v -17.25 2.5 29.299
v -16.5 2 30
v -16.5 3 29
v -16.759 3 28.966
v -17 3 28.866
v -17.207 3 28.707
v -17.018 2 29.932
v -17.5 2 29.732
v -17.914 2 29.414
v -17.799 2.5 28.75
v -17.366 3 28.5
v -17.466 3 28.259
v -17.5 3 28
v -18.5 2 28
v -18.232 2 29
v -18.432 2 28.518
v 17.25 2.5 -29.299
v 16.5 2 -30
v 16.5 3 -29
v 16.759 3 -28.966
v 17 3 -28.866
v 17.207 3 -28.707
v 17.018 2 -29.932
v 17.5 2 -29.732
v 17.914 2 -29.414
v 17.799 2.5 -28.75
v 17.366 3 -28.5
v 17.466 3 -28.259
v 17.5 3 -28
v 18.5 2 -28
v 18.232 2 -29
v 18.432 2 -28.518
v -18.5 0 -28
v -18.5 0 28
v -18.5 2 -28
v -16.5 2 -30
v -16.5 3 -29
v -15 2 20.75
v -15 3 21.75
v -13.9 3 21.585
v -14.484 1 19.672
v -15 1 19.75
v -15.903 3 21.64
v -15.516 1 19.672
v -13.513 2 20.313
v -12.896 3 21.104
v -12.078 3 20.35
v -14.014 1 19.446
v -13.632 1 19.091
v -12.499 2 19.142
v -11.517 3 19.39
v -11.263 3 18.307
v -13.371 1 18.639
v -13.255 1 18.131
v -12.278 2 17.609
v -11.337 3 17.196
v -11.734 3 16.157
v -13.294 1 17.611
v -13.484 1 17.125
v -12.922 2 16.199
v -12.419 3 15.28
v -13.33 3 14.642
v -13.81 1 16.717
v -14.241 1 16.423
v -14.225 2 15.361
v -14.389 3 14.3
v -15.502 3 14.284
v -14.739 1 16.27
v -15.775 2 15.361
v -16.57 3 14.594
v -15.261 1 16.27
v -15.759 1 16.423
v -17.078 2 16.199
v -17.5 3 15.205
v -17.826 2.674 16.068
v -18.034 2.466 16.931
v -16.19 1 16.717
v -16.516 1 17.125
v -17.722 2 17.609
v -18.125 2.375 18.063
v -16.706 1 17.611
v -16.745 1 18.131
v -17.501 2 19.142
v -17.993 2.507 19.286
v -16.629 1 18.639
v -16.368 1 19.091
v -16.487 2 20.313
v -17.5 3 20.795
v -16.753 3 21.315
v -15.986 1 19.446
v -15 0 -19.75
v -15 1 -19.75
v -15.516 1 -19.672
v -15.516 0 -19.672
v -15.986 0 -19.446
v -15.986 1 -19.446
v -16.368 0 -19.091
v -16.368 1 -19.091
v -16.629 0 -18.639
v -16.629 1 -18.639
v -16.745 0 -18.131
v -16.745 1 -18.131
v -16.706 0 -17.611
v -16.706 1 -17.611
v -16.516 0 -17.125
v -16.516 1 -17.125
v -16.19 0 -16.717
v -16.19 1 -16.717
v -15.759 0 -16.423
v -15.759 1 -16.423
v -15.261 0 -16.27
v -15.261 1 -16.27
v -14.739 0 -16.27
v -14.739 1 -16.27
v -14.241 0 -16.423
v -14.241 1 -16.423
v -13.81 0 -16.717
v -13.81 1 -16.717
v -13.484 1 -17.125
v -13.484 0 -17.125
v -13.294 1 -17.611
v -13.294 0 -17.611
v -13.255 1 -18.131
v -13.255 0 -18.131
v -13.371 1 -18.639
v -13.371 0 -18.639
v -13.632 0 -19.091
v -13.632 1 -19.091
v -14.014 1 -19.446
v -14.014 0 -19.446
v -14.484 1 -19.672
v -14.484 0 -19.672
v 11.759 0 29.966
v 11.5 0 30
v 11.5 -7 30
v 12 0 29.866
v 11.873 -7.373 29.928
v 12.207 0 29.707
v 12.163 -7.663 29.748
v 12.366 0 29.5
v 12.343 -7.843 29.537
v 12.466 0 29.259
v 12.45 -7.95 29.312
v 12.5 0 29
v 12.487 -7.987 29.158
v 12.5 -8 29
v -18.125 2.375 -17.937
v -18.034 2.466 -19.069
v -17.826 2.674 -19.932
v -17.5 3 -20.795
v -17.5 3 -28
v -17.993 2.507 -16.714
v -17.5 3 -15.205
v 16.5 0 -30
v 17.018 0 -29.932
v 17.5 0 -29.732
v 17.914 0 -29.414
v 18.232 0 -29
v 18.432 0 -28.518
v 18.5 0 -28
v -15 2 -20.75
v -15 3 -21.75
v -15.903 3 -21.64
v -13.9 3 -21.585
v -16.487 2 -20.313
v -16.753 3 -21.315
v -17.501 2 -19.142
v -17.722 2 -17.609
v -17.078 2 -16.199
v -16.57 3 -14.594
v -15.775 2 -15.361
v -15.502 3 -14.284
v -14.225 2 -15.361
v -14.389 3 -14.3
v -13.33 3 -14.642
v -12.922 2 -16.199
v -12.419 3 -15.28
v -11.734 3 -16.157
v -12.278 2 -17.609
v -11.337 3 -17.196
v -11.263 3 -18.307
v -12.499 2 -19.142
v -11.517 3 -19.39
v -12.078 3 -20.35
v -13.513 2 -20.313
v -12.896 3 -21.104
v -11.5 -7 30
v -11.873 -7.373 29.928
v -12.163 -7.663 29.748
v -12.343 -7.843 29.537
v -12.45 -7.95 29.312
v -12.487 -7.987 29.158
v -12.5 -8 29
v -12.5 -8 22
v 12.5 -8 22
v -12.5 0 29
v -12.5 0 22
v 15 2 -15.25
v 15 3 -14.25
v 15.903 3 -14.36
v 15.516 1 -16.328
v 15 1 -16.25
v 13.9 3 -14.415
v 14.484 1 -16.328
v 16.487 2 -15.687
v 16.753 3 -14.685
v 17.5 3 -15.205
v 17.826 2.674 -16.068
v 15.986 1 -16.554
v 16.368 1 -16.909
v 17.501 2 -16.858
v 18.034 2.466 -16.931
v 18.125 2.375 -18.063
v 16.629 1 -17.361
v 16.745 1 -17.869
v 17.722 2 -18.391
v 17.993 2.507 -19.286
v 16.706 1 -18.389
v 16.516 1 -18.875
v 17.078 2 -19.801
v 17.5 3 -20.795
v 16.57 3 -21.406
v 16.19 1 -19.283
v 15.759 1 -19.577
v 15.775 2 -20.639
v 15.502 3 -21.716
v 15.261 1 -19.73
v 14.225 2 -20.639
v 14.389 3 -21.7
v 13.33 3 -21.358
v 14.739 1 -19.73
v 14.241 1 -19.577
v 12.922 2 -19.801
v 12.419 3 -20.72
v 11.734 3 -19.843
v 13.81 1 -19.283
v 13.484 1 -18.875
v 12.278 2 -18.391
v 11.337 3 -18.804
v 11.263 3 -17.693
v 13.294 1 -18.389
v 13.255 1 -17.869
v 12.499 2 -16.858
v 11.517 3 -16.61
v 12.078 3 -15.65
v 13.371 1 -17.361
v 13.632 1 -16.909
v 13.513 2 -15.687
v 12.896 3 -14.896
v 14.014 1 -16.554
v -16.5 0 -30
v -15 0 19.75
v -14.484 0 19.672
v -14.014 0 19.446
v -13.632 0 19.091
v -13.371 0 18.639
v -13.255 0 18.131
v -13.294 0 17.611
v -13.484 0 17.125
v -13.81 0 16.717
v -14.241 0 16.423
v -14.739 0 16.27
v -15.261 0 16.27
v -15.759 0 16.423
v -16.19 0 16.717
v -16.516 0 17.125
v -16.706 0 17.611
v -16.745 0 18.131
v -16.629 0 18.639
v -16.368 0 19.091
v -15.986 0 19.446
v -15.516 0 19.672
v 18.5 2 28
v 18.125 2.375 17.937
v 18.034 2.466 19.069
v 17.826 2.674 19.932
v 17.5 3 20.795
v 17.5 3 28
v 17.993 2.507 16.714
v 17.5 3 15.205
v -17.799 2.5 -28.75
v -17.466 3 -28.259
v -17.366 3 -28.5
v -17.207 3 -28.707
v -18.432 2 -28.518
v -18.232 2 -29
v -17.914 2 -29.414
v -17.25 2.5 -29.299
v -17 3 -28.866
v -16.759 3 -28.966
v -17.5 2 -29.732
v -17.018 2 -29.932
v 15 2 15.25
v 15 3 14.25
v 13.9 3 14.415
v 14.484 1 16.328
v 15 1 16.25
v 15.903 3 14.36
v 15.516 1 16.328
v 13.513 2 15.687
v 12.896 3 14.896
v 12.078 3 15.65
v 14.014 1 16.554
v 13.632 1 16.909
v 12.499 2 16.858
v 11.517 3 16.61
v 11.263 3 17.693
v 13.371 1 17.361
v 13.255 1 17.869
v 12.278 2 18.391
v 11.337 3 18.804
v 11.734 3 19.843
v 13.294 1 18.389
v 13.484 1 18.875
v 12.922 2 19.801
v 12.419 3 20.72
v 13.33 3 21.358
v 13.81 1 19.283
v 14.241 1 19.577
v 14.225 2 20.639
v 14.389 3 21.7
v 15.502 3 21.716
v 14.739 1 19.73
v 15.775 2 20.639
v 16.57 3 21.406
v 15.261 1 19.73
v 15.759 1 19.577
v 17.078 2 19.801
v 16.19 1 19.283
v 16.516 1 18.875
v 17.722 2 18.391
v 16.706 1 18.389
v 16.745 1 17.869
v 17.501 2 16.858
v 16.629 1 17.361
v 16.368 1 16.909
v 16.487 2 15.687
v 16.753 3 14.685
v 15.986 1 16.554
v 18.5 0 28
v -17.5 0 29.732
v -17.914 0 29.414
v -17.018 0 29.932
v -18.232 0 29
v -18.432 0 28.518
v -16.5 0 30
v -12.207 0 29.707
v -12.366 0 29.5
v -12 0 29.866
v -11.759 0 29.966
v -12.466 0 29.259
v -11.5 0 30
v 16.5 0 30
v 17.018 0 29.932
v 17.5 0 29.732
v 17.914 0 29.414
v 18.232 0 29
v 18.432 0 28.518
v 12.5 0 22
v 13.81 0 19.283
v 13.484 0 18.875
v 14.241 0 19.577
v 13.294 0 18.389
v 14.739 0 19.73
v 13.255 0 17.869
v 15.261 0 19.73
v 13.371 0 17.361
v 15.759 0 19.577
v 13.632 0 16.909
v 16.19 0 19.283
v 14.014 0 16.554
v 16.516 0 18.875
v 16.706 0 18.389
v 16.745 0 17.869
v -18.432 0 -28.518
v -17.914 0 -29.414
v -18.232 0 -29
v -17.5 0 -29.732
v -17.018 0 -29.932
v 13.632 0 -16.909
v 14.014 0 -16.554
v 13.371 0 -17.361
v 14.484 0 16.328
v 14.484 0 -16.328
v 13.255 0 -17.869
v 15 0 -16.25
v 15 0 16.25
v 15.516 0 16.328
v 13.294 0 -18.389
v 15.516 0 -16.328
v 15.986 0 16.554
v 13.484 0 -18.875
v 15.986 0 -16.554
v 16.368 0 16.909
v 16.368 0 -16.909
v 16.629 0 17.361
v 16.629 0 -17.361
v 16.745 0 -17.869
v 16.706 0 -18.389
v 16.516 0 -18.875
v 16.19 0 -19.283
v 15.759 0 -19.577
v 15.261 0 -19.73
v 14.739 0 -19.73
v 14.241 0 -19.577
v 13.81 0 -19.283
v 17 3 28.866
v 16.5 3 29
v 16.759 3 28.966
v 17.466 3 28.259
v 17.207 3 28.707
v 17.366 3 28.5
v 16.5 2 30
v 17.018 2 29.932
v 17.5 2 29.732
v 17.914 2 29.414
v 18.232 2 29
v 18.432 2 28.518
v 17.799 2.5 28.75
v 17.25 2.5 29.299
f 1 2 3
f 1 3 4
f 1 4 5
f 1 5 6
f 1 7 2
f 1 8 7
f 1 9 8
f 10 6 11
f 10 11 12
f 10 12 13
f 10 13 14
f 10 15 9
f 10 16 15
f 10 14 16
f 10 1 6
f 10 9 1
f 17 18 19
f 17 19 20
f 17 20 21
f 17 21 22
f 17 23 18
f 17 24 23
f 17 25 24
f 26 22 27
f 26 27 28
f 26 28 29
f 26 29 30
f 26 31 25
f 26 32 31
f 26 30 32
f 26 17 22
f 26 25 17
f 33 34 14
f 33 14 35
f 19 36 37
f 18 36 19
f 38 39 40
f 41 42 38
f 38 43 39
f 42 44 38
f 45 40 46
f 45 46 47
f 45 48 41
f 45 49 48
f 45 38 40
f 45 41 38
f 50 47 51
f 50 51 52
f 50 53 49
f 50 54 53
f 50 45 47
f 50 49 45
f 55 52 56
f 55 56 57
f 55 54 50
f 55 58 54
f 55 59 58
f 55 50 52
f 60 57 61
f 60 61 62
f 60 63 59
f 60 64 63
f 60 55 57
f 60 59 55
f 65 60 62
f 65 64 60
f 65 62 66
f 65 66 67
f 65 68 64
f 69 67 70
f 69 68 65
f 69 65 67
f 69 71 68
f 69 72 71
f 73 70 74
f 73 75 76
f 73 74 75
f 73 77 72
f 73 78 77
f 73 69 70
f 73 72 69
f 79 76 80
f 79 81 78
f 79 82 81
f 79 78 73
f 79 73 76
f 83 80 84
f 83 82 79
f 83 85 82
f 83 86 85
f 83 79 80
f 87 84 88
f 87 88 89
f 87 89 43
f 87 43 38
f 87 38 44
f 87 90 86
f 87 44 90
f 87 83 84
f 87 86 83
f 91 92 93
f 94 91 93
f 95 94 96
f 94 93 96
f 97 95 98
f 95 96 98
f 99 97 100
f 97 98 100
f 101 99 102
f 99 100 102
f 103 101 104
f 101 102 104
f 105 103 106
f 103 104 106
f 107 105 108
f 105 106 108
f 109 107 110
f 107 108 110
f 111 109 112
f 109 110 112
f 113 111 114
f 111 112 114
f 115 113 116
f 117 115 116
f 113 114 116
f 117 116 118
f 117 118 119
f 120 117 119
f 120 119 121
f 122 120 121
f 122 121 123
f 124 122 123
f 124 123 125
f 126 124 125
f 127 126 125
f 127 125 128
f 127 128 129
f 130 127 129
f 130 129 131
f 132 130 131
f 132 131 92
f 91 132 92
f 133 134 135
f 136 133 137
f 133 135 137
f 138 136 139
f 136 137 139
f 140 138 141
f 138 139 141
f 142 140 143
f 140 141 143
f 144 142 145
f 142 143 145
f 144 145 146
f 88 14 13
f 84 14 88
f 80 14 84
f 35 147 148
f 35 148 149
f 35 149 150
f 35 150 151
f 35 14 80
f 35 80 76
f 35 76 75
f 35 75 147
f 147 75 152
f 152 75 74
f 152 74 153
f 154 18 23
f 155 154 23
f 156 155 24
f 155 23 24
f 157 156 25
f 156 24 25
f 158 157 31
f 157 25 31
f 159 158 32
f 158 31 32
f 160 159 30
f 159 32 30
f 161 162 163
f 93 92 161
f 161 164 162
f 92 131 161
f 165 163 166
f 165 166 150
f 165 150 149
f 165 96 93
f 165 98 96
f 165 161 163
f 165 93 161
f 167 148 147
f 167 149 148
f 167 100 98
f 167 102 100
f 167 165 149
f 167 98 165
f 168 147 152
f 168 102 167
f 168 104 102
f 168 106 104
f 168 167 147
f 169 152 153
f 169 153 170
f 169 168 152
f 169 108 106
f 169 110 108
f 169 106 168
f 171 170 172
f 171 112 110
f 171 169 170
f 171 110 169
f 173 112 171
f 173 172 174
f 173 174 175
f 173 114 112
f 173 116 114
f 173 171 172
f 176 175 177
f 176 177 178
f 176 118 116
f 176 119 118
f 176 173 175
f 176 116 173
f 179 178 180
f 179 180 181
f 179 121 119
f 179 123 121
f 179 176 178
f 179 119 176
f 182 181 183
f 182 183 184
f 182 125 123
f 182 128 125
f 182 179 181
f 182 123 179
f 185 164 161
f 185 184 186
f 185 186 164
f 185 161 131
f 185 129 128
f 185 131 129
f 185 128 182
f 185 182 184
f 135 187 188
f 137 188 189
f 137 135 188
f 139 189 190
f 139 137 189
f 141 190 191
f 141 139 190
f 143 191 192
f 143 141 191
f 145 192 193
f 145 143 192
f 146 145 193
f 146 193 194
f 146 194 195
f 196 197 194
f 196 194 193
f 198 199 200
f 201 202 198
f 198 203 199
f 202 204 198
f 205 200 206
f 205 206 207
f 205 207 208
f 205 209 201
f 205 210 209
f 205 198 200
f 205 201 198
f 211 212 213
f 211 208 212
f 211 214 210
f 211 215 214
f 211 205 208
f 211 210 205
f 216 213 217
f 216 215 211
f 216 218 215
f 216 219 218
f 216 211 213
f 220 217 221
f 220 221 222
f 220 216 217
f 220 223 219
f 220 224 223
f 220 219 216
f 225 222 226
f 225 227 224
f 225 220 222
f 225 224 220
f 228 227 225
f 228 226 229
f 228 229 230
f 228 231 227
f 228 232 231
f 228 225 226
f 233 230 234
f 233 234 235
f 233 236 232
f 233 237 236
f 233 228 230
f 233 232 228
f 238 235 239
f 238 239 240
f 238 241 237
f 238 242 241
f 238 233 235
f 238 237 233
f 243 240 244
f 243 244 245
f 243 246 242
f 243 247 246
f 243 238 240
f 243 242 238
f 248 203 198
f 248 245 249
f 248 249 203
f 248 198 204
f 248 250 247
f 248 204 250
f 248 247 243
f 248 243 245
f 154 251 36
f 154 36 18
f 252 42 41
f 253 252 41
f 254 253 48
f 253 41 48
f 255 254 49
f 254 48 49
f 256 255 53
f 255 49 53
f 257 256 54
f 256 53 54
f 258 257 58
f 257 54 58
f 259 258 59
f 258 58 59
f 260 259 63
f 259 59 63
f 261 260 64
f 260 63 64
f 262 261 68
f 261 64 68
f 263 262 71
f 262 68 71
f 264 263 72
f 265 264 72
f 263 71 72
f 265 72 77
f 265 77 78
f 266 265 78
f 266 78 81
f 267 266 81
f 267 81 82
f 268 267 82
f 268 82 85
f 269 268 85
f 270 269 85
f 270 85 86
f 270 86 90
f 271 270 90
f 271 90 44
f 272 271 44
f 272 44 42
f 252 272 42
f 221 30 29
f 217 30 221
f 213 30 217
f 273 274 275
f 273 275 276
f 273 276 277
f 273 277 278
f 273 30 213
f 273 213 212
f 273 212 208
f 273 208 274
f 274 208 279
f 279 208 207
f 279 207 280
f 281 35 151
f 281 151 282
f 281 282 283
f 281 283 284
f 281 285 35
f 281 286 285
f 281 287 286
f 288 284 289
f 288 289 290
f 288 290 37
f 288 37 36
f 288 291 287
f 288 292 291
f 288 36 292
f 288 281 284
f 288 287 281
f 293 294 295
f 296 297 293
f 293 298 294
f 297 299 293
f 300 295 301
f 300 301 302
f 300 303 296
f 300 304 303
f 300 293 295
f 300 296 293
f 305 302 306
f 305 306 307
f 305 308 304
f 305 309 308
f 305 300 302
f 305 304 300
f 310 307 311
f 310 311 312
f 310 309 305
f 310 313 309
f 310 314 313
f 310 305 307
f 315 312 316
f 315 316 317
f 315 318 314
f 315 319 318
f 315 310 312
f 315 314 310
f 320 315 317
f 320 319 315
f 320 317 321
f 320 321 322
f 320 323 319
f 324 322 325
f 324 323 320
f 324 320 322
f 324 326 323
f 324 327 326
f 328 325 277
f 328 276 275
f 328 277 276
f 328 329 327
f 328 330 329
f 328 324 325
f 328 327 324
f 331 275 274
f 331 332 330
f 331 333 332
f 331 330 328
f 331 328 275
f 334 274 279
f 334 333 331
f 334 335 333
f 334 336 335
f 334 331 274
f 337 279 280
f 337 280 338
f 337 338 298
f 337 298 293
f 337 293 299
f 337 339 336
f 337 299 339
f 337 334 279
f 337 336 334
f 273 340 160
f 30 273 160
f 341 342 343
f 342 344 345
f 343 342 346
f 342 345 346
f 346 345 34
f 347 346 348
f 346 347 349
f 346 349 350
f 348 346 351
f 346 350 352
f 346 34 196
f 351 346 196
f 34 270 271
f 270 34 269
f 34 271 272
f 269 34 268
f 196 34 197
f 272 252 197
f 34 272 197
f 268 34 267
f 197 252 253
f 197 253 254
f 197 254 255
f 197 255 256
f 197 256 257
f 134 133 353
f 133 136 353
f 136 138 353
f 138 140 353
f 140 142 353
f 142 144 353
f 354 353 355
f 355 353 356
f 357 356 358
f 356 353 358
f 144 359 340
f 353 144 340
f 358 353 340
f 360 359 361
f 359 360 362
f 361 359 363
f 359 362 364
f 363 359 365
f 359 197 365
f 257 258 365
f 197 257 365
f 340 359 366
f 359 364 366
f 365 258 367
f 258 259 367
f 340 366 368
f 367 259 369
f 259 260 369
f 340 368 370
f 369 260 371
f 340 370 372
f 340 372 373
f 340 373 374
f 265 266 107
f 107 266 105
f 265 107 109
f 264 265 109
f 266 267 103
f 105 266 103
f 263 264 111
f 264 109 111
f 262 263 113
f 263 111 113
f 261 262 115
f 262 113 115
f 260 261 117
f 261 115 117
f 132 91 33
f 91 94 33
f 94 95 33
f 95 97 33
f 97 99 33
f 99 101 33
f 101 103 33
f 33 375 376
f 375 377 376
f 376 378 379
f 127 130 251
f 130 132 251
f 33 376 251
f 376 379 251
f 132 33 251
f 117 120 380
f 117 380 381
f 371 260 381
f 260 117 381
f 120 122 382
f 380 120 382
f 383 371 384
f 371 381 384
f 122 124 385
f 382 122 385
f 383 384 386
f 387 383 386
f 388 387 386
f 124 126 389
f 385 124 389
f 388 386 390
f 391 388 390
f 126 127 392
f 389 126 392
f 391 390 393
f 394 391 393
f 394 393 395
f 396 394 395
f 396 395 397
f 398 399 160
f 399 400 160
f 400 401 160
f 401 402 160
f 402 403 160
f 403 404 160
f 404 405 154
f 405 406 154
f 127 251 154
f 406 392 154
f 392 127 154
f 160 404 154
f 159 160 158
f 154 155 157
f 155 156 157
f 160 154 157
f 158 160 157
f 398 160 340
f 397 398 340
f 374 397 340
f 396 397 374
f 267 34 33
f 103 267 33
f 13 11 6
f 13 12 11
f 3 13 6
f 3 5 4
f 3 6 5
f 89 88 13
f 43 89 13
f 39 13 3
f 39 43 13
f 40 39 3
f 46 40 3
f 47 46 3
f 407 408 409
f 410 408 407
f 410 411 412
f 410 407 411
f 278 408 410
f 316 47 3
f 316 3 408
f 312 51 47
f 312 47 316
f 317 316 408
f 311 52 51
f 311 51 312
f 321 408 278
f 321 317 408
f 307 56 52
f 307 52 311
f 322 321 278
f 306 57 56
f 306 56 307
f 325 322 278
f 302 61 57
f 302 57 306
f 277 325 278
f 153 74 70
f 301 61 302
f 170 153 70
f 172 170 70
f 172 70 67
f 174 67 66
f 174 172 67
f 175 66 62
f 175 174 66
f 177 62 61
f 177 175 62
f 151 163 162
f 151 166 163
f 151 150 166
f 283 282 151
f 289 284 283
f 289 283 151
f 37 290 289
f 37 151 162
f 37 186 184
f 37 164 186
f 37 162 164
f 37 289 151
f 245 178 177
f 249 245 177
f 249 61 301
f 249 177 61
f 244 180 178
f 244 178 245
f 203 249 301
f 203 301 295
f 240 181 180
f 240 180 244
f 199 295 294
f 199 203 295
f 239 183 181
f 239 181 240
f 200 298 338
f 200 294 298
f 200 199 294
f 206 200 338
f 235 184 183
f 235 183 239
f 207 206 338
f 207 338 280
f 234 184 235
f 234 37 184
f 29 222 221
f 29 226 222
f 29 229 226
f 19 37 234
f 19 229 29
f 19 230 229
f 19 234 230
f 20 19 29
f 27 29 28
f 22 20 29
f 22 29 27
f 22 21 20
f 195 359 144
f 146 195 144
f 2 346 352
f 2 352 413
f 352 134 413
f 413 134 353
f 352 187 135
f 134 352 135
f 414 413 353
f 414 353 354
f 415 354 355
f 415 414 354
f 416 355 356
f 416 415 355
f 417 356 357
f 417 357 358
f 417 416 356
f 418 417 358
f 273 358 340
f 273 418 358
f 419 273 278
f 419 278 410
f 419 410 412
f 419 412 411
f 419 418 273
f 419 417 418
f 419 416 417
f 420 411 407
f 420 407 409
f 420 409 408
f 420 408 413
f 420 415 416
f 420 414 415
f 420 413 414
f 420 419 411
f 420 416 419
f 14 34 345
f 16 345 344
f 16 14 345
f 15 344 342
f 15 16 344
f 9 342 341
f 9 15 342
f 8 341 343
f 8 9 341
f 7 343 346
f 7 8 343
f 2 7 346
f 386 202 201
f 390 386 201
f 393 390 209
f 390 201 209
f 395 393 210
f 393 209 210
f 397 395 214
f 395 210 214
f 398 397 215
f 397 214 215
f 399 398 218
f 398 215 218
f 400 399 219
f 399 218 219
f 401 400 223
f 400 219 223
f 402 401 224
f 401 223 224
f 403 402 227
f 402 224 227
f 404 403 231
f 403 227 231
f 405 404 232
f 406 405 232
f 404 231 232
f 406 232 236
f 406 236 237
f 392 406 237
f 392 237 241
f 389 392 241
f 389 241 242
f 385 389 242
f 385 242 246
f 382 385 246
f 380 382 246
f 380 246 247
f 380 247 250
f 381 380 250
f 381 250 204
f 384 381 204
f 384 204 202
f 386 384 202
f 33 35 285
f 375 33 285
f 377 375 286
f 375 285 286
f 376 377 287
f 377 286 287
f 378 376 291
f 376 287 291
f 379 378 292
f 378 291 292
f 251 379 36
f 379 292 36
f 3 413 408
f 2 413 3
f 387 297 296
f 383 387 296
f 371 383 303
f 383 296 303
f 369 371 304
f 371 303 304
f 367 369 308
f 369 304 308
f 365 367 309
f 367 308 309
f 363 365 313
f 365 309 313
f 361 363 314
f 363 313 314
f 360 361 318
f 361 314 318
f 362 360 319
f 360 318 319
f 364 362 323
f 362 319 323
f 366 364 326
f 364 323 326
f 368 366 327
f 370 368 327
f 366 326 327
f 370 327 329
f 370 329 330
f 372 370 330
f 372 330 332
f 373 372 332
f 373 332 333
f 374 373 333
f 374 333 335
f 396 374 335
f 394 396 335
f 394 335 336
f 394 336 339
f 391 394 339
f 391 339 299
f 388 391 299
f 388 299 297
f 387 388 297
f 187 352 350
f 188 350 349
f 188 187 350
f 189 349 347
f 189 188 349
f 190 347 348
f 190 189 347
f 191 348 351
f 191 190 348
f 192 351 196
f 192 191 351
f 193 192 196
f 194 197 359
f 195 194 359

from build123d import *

# Parameters (mm, degrees)
SKETCH_1_W          = 37
SKETCH_1_H          = 60
EXTRUDE_1_DEPTH     = 3
SKETCH_2_R          = 1.75
CUT_EXTRUDE_1_DEPTH = 3
FILLET_1_R          = 2
SKETCH_3_W          = 25
SKETCH_3_H          = 8
EXTRUDE_2_DEPTH     = 8
FILLET_2_R          = 1
CHAMFER_2_SIZE      = 1
CHAMFER_1_SIZE      = 2


with BuildPart() as part:
    # Эскиз1 → Бобышка-Вытянуть1 (new body)
    with BuildSketch(Plane(origin=(0, 0, 0), x_dir=(1, 0, 0), z_dir=(0, 1, 0))):
        Rectangle(SKETCH_1_W, SKETCH_1_H)
    extrude(amount=EXTRUDE_1_DEPTH)

    # Эскиз2 → Вырез-Вытянуть1 (cut)
    with BuildSketch(Plane(origin=(0, 3, 0), x_dir=(1, 0, 0), z_dir=(0, 1, 0))):
        with Locations(Location((15, 18, 0), (0, 0, 270))):
            Circle(SKETCH_2_R)
        with Locations(Location((15, -18, 0), (0, 0, 90))):
            Circle(SKETCH_2_R)
        with Locations(Location((-15, -18, 0), (0, 0, 270))):
            Circle(SKETCH_2_R)
        with Locations(Location((-15, 18, 0), (0, 0, 90))):
            Circle(SKETCH_2_R)
    extrude(amount=-CUT_EXTRUDE_1_DEPTH, mode=Mode.SUBTRACT)

    # Скругление1
    fillet_1_edges = [part.edges().sort_by_distance(p)[0] for p in [
        (18.5, 1.5, 30),
        (-18.5, 1.5, 30),
        (-18.5, 1.5, -30),
        (18.5, 1.5, -30),
    ]]
    fillet(fillet_1_edges, radius=FILLET_1_R)

    # Эскиз3 → Бобышка-Вытянуть2 (add)
    with BuildSketch(Plane.XZ):
        with Locations((0, 26)):
            Rectangle(SKETCH_3_W, SKETCH_3_H)
    extrude(amount=EXTRUDE_2_DEPTH)

    # Скругление2
    fillet_2_edges = [part.edges().sort_by_distance(p)[0] for p in [
        (12.5, -4, 30),
        (-12.5, -4, 30),
        (0, -8, 30),
    ]]
    fillet(fillet_2_edges, radius=FILLET_2_R)

    # Фаска2
    chamfer_2_edges = [part.edges().sort_by_distance(p)[0] for p in [
        (0, 3, -30),
        (18.5, 3, 0),
        (-18.5, 3, 0),
        (0, 3, 30),
        (17.914213562, 3, 29.414213562),
        (-17.914213562, 3, 29.414213562),
        (-17.914213562, 3, -29.414213562),
        (17.914213562, 3, -29.414213562),
    ]]
    chamfer(chamfer_2_edges, length=CHAMFER_2_SIZE)

    # Фаска1
    # the kernel refuses this chamfer: 2 mm, written as the material it takes off along each edge
    with BuildSketch(Plane(origin=(-15, 3, -18), x_dir=(0, 0, -1), z_dir=(1, 0, 0))) as chamfer_1_piece_1:
        Polygon((1.75 + CHAMFER_1_SIZE, 0), (1.75, -CHAMFER_1_SIZE), (1.75, 0), align=None)
    revolve(axis=Axis((-15, 3, -18), (0, 1, 0)), mode=Mode.SUBTRACT)
    with BuildSketch(Plane(origin=(-15, 3, 18), x_dir=(0, 0, 1), z_dir=(-1, 0, 0))) as chamfer_1_piece_2:
        Polygon((1.75 + CHAMFER_1_SIZE, 0), (1.75, -CHAMFER_1_SIZE), (1.75, 0), align=None)
    revolve(axis=Axis((-15, 3, 18), (0, 1, 0)), mode=Mode.SUBTRACT)
    with BuildSketch(Plane(origin=(15, 3, 18), x_dir=(0, 0, -1), z_dir=(1, 0, 0))) as chamfer_1_piece_3:
        Polygon((1.75 + CHAMFER_1_SIZE, 0), (1.75, -CHAMFER_1_SIZE), (1.75, 0), align=None)
    revolve(axis=Axis((15, 3, 18), (0, 1, 0)), mode=Mode.SUBTRACT)
    with BuildSketch(Plane(origin=(15, 3, -18), x_dir=(0, 0, 1), z_dir=(-1, 0, 0))) as chamfer_1_piece_4:
        Polygon((1.75 + CHAMFER_1_SIZE, 0), (1.75, -CHAMFER_1_SIZE), (1.75, 0), align=None)
    revolve(axis=Axis((15, 3, -18), (0, 1, 0)), mode=Mode.SUBTRACT)


solid = part.part
